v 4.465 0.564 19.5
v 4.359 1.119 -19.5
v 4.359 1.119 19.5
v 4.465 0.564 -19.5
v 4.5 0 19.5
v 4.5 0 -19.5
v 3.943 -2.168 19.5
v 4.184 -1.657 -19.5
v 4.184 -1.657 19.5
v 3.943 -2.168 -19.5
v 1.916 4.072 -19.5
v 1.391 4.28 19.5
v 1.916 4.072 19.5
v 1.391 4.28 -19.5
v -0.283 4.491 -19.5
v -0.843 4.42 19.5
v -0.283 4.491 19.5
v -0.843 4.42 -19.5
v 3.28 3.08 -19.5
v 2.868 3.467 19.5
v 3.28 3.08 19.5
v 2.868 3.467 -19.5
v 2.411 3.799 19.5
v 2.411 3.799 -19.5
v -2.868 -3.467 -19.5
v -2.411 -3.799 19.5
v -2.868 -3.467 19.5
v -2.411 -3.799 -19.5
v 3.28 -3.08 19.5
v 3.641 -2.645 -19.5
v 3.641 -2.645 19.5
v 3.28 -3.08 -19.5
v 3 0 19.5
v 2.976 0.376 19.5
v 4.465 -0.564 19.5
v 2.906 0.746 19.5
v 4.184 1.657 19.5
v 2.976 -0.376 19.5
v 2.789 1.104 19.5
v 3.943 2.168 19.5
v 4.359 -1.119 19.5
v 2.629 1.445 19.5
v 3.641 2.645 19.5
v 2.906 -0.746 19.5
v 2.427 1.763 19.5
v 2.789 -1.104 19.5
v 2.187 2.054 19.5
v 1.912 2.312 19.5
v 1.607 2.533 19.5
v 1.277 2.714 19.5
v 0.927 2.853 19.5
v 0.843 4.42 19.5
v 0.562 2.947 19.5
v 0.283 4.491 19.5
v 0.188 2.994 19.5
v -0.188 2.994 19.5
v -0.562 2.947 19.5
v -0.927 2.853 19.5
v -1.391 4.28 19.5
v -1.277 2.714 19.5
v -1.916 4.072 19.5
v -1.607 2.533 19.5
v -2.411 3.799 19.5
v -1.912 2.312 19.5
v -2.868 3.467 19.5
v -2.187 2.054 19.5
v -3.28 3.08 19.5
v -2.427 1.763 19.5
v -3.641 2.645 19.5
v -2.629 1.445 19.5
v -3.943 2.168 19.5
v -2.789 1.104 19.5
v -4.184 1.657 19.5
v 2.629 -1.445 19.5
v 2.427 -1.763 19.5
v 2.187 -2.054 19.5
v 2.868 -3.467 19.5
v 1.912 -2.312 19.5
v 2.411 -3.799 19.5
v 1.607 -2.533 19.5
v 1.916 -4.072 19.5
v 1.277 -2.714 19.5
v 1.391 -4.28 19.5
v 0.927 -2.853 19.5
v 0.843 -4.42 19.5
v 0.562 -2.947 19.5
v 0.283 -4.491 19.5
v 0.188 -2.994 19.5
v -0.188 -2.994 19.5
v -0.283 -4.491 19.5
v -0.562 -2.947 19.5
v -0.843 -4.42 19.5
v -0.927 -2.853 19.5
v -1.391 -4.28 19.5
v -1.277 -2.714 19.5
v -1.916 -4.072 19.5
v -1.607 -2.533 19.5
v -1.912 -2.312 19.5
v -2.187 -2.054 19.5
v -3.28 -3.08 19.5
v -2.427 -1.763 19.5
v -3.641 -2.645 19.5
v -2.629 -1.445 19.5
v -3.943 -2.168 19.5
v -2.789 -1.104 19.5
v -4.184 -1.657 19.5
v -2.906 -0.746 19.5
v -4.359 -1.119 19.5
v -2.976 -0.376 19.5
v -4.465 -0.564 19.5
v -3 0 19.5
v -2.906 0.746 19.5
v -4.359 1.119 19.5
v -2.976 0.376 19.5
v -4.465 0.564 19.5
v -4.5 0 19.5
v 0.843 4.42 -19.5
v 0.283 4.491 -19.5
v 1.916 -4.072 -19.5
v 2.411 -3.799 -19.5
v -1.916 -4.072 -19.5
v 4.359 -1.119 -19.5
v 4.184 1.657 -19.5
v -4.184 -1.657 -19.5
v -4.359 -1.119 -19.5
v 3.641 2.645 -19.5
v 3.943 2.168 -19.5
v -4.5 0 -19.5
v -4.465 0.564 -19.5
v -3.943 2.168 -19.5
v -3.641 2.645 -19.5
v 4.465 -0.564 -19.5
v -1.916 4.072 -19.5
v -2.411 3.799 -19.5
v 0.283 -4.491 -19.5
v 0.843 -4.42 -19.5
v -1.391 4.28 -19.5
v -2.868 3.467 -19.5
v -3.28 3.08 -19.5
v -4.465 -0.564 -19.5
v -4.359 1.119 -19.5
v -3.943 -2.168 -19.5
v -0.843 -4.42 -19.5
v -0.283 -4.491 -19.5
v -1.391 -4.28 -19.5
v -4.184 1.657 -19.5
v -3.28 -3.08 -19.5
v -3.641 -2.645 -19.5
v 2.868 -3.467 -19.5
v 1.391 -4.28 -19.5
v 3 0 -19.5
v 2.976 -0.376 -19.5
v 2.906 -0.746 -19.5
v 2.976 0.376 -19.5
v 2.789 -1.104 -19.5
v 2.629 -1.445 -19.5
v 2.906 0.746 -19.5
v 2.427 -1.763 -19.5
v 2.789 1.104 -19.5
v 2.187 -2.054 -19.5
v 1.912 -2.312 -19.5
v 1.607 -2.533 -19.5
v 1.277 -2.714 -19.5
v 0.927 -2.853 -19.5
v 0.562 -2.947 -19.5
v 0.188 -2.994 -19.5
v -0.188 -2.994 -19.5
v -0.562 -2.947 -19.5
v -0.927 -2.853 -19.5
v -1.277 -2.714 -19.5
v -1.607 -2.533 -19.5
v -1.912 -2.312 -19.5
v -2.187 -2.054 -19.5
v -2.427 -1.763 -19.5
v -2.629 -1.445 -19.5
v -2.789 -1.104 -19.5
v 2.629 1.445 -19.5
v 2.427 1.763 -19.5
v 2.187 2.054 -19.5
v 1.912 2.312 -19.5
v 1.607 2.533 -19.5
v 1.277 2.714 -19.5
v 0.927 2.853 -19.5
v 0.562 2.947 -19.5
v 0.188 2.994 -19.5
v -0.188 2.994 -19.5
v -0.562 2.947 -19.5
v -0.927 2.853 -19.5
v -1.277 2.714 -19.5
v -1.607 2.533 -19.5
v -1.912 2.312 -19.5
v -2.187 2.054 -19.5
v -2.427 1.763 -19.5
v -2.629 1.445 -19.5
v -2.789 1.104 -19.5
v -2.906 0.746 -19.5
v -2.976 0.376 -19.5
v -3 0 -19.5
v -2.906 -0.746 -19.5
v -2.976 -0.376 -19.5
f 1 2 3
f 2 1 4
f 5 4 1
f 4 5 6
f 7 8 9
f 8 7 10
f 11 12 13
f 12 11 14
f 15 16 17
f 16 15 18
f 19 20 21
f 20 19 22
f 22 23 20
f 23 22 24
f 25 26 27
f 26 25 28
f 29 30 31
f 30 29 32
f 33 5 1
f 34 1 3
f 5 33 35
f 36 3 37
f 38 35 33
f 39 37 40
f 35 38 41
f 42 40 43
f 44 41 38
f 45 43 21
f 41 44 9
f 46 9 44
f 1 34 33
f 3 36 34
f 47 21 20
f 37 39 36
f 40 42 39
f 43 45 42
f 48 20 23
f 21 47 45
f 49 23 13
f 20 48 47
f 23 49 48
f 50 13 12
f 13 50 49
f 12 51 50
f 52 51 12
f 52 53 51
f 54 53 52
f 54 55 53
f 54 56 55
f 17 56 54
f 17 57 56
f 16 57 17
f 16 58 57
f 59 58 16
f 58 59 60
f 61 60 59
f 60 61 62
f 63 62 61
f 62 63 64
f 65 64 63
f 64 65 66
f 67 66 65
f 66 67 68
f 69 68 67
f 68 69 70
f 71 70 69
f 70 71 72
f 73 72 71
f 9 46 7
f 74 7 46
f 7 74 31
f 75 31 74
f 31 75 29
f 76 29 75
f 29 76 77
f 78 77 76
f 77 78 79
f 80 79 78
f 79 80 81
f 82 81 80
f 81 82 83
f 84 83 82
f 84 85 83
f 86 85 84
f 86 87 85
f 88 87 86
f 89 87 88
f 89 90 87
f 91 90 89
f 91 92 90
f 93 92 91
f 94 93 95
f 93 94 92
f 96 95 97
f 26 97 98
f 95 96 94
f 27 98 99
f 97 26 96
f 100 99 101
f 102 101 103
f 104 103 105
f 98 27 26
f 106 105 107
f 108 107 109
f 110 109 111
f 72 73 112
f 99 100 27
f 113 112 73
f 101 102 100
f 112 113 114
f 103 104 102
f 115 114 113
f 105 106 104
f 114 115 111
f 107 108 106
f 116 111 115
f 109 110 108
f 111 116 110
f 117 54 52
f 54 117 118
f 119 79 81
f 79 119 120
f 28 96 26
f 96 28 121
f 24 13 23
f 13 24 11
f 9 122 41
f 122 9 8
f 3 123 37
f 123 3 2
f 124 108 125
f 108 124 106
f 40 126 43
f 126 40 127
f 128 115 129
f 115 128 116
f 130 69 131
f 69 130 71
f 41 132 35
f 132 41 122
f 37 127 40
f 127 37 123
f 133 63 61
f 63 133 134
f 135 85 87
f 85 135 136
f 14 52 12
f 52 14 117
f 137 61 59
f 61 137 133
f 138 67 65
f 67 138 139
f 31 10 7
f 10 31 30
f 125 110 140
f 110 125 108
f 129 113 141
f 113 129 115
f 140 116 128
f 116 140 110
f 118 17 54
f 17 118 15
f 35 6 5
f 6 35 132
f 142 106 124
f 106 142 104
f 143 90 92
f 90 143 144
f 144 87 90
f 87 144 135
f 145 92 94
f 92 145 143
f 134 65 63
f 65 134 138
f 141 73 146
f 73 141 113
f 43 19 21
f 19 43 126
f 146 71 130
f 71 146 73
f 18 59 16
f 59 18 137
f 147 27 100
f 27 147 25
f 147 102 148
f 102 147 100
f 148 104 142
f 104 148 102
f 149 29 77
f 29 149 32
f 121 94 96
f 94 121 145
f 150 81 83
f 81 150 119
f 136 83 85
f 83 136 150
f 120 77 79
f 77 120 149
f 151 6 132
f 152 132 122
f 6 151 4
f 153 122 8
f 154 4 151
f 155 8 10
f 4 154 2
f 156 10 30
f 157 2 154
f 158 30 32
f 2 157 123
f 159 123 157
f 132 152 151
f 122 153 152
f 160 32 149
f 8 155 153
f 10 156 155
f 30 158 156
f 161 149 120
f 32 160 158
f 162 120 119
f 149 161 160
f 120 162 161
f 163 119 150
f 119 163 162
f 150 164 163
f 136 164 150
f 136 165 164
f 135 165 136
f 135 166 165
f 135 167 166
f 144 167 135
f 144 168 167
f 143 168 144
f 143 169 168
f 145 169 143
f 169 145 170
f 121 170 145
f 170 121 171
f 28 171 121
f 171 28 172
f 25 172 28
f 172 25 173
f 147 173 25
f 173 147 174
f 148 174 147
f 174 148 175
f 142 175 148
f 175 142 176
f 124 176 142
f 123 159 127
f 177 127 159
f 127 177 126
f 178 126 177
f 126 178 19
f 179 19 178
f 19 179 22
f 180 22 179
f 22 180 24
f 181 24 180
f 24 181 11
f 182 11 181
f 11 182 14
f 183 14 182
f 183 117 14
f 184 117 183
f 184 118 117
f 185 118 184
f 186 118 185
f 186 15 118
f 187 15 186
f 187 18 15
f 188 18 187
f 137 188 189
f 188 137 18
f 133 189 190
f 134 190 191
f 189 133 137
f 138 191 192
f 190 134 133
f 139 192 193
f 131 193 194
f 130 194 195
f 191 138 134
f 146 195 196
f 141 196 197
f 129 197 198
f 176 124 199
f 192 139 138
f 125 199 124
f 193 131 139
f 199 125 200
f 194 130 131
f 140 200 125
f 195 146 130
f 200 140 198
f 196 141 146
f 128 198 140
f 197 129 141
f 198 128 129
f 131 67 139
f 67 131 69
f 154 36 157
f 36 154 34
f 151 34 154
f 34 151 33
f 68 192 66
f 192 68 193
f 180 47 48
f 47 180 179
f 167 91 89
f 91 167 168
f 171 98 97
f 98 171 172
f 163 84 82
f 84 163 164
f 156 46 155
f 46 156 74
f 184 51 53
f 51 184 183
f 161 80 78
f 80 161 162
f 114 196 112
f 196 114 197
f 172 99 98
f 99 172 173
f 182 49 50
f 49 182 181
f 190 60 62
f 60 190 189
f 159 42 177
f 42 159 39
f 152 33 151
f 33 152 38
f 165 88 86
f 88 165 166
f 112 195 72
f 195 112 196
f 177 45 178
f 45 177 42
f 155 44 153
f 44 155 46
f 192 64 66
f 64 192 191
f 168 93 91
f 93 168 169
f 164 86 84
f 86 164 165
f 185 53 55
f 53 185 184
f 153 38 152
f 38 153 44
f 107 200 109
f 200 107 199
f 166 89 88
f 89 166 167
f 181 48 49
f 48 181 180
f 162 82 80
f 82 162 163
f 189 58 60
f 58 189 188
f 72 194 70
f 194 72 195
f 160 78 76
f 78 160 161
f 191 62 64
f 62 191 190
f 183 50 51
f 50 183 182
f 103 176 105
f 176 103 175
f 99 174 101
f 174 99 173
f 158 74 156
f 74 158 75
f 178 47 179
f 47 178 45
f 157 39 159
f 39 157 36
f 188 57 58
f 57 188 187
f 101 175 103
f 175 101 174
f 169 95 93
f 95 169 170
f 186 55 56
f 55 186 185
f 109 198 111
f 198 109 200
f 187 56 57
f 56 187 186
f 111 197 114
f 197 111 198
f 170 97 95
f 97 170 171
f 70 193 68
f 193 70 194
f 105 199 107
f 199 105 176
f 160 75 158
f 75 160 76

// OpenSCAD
$fn = 50;


difference() {
	union() {
		translate(v = [0, 0, -19.5000000000]) {
			cylinder(h = 39, r = 4.5000000000);
		}
	}
	union() {
		translate(v = [0, 0, -100.0000000000]) {
			cylinder(h = 200, r = 3.0000000000);
		}
	}
}
